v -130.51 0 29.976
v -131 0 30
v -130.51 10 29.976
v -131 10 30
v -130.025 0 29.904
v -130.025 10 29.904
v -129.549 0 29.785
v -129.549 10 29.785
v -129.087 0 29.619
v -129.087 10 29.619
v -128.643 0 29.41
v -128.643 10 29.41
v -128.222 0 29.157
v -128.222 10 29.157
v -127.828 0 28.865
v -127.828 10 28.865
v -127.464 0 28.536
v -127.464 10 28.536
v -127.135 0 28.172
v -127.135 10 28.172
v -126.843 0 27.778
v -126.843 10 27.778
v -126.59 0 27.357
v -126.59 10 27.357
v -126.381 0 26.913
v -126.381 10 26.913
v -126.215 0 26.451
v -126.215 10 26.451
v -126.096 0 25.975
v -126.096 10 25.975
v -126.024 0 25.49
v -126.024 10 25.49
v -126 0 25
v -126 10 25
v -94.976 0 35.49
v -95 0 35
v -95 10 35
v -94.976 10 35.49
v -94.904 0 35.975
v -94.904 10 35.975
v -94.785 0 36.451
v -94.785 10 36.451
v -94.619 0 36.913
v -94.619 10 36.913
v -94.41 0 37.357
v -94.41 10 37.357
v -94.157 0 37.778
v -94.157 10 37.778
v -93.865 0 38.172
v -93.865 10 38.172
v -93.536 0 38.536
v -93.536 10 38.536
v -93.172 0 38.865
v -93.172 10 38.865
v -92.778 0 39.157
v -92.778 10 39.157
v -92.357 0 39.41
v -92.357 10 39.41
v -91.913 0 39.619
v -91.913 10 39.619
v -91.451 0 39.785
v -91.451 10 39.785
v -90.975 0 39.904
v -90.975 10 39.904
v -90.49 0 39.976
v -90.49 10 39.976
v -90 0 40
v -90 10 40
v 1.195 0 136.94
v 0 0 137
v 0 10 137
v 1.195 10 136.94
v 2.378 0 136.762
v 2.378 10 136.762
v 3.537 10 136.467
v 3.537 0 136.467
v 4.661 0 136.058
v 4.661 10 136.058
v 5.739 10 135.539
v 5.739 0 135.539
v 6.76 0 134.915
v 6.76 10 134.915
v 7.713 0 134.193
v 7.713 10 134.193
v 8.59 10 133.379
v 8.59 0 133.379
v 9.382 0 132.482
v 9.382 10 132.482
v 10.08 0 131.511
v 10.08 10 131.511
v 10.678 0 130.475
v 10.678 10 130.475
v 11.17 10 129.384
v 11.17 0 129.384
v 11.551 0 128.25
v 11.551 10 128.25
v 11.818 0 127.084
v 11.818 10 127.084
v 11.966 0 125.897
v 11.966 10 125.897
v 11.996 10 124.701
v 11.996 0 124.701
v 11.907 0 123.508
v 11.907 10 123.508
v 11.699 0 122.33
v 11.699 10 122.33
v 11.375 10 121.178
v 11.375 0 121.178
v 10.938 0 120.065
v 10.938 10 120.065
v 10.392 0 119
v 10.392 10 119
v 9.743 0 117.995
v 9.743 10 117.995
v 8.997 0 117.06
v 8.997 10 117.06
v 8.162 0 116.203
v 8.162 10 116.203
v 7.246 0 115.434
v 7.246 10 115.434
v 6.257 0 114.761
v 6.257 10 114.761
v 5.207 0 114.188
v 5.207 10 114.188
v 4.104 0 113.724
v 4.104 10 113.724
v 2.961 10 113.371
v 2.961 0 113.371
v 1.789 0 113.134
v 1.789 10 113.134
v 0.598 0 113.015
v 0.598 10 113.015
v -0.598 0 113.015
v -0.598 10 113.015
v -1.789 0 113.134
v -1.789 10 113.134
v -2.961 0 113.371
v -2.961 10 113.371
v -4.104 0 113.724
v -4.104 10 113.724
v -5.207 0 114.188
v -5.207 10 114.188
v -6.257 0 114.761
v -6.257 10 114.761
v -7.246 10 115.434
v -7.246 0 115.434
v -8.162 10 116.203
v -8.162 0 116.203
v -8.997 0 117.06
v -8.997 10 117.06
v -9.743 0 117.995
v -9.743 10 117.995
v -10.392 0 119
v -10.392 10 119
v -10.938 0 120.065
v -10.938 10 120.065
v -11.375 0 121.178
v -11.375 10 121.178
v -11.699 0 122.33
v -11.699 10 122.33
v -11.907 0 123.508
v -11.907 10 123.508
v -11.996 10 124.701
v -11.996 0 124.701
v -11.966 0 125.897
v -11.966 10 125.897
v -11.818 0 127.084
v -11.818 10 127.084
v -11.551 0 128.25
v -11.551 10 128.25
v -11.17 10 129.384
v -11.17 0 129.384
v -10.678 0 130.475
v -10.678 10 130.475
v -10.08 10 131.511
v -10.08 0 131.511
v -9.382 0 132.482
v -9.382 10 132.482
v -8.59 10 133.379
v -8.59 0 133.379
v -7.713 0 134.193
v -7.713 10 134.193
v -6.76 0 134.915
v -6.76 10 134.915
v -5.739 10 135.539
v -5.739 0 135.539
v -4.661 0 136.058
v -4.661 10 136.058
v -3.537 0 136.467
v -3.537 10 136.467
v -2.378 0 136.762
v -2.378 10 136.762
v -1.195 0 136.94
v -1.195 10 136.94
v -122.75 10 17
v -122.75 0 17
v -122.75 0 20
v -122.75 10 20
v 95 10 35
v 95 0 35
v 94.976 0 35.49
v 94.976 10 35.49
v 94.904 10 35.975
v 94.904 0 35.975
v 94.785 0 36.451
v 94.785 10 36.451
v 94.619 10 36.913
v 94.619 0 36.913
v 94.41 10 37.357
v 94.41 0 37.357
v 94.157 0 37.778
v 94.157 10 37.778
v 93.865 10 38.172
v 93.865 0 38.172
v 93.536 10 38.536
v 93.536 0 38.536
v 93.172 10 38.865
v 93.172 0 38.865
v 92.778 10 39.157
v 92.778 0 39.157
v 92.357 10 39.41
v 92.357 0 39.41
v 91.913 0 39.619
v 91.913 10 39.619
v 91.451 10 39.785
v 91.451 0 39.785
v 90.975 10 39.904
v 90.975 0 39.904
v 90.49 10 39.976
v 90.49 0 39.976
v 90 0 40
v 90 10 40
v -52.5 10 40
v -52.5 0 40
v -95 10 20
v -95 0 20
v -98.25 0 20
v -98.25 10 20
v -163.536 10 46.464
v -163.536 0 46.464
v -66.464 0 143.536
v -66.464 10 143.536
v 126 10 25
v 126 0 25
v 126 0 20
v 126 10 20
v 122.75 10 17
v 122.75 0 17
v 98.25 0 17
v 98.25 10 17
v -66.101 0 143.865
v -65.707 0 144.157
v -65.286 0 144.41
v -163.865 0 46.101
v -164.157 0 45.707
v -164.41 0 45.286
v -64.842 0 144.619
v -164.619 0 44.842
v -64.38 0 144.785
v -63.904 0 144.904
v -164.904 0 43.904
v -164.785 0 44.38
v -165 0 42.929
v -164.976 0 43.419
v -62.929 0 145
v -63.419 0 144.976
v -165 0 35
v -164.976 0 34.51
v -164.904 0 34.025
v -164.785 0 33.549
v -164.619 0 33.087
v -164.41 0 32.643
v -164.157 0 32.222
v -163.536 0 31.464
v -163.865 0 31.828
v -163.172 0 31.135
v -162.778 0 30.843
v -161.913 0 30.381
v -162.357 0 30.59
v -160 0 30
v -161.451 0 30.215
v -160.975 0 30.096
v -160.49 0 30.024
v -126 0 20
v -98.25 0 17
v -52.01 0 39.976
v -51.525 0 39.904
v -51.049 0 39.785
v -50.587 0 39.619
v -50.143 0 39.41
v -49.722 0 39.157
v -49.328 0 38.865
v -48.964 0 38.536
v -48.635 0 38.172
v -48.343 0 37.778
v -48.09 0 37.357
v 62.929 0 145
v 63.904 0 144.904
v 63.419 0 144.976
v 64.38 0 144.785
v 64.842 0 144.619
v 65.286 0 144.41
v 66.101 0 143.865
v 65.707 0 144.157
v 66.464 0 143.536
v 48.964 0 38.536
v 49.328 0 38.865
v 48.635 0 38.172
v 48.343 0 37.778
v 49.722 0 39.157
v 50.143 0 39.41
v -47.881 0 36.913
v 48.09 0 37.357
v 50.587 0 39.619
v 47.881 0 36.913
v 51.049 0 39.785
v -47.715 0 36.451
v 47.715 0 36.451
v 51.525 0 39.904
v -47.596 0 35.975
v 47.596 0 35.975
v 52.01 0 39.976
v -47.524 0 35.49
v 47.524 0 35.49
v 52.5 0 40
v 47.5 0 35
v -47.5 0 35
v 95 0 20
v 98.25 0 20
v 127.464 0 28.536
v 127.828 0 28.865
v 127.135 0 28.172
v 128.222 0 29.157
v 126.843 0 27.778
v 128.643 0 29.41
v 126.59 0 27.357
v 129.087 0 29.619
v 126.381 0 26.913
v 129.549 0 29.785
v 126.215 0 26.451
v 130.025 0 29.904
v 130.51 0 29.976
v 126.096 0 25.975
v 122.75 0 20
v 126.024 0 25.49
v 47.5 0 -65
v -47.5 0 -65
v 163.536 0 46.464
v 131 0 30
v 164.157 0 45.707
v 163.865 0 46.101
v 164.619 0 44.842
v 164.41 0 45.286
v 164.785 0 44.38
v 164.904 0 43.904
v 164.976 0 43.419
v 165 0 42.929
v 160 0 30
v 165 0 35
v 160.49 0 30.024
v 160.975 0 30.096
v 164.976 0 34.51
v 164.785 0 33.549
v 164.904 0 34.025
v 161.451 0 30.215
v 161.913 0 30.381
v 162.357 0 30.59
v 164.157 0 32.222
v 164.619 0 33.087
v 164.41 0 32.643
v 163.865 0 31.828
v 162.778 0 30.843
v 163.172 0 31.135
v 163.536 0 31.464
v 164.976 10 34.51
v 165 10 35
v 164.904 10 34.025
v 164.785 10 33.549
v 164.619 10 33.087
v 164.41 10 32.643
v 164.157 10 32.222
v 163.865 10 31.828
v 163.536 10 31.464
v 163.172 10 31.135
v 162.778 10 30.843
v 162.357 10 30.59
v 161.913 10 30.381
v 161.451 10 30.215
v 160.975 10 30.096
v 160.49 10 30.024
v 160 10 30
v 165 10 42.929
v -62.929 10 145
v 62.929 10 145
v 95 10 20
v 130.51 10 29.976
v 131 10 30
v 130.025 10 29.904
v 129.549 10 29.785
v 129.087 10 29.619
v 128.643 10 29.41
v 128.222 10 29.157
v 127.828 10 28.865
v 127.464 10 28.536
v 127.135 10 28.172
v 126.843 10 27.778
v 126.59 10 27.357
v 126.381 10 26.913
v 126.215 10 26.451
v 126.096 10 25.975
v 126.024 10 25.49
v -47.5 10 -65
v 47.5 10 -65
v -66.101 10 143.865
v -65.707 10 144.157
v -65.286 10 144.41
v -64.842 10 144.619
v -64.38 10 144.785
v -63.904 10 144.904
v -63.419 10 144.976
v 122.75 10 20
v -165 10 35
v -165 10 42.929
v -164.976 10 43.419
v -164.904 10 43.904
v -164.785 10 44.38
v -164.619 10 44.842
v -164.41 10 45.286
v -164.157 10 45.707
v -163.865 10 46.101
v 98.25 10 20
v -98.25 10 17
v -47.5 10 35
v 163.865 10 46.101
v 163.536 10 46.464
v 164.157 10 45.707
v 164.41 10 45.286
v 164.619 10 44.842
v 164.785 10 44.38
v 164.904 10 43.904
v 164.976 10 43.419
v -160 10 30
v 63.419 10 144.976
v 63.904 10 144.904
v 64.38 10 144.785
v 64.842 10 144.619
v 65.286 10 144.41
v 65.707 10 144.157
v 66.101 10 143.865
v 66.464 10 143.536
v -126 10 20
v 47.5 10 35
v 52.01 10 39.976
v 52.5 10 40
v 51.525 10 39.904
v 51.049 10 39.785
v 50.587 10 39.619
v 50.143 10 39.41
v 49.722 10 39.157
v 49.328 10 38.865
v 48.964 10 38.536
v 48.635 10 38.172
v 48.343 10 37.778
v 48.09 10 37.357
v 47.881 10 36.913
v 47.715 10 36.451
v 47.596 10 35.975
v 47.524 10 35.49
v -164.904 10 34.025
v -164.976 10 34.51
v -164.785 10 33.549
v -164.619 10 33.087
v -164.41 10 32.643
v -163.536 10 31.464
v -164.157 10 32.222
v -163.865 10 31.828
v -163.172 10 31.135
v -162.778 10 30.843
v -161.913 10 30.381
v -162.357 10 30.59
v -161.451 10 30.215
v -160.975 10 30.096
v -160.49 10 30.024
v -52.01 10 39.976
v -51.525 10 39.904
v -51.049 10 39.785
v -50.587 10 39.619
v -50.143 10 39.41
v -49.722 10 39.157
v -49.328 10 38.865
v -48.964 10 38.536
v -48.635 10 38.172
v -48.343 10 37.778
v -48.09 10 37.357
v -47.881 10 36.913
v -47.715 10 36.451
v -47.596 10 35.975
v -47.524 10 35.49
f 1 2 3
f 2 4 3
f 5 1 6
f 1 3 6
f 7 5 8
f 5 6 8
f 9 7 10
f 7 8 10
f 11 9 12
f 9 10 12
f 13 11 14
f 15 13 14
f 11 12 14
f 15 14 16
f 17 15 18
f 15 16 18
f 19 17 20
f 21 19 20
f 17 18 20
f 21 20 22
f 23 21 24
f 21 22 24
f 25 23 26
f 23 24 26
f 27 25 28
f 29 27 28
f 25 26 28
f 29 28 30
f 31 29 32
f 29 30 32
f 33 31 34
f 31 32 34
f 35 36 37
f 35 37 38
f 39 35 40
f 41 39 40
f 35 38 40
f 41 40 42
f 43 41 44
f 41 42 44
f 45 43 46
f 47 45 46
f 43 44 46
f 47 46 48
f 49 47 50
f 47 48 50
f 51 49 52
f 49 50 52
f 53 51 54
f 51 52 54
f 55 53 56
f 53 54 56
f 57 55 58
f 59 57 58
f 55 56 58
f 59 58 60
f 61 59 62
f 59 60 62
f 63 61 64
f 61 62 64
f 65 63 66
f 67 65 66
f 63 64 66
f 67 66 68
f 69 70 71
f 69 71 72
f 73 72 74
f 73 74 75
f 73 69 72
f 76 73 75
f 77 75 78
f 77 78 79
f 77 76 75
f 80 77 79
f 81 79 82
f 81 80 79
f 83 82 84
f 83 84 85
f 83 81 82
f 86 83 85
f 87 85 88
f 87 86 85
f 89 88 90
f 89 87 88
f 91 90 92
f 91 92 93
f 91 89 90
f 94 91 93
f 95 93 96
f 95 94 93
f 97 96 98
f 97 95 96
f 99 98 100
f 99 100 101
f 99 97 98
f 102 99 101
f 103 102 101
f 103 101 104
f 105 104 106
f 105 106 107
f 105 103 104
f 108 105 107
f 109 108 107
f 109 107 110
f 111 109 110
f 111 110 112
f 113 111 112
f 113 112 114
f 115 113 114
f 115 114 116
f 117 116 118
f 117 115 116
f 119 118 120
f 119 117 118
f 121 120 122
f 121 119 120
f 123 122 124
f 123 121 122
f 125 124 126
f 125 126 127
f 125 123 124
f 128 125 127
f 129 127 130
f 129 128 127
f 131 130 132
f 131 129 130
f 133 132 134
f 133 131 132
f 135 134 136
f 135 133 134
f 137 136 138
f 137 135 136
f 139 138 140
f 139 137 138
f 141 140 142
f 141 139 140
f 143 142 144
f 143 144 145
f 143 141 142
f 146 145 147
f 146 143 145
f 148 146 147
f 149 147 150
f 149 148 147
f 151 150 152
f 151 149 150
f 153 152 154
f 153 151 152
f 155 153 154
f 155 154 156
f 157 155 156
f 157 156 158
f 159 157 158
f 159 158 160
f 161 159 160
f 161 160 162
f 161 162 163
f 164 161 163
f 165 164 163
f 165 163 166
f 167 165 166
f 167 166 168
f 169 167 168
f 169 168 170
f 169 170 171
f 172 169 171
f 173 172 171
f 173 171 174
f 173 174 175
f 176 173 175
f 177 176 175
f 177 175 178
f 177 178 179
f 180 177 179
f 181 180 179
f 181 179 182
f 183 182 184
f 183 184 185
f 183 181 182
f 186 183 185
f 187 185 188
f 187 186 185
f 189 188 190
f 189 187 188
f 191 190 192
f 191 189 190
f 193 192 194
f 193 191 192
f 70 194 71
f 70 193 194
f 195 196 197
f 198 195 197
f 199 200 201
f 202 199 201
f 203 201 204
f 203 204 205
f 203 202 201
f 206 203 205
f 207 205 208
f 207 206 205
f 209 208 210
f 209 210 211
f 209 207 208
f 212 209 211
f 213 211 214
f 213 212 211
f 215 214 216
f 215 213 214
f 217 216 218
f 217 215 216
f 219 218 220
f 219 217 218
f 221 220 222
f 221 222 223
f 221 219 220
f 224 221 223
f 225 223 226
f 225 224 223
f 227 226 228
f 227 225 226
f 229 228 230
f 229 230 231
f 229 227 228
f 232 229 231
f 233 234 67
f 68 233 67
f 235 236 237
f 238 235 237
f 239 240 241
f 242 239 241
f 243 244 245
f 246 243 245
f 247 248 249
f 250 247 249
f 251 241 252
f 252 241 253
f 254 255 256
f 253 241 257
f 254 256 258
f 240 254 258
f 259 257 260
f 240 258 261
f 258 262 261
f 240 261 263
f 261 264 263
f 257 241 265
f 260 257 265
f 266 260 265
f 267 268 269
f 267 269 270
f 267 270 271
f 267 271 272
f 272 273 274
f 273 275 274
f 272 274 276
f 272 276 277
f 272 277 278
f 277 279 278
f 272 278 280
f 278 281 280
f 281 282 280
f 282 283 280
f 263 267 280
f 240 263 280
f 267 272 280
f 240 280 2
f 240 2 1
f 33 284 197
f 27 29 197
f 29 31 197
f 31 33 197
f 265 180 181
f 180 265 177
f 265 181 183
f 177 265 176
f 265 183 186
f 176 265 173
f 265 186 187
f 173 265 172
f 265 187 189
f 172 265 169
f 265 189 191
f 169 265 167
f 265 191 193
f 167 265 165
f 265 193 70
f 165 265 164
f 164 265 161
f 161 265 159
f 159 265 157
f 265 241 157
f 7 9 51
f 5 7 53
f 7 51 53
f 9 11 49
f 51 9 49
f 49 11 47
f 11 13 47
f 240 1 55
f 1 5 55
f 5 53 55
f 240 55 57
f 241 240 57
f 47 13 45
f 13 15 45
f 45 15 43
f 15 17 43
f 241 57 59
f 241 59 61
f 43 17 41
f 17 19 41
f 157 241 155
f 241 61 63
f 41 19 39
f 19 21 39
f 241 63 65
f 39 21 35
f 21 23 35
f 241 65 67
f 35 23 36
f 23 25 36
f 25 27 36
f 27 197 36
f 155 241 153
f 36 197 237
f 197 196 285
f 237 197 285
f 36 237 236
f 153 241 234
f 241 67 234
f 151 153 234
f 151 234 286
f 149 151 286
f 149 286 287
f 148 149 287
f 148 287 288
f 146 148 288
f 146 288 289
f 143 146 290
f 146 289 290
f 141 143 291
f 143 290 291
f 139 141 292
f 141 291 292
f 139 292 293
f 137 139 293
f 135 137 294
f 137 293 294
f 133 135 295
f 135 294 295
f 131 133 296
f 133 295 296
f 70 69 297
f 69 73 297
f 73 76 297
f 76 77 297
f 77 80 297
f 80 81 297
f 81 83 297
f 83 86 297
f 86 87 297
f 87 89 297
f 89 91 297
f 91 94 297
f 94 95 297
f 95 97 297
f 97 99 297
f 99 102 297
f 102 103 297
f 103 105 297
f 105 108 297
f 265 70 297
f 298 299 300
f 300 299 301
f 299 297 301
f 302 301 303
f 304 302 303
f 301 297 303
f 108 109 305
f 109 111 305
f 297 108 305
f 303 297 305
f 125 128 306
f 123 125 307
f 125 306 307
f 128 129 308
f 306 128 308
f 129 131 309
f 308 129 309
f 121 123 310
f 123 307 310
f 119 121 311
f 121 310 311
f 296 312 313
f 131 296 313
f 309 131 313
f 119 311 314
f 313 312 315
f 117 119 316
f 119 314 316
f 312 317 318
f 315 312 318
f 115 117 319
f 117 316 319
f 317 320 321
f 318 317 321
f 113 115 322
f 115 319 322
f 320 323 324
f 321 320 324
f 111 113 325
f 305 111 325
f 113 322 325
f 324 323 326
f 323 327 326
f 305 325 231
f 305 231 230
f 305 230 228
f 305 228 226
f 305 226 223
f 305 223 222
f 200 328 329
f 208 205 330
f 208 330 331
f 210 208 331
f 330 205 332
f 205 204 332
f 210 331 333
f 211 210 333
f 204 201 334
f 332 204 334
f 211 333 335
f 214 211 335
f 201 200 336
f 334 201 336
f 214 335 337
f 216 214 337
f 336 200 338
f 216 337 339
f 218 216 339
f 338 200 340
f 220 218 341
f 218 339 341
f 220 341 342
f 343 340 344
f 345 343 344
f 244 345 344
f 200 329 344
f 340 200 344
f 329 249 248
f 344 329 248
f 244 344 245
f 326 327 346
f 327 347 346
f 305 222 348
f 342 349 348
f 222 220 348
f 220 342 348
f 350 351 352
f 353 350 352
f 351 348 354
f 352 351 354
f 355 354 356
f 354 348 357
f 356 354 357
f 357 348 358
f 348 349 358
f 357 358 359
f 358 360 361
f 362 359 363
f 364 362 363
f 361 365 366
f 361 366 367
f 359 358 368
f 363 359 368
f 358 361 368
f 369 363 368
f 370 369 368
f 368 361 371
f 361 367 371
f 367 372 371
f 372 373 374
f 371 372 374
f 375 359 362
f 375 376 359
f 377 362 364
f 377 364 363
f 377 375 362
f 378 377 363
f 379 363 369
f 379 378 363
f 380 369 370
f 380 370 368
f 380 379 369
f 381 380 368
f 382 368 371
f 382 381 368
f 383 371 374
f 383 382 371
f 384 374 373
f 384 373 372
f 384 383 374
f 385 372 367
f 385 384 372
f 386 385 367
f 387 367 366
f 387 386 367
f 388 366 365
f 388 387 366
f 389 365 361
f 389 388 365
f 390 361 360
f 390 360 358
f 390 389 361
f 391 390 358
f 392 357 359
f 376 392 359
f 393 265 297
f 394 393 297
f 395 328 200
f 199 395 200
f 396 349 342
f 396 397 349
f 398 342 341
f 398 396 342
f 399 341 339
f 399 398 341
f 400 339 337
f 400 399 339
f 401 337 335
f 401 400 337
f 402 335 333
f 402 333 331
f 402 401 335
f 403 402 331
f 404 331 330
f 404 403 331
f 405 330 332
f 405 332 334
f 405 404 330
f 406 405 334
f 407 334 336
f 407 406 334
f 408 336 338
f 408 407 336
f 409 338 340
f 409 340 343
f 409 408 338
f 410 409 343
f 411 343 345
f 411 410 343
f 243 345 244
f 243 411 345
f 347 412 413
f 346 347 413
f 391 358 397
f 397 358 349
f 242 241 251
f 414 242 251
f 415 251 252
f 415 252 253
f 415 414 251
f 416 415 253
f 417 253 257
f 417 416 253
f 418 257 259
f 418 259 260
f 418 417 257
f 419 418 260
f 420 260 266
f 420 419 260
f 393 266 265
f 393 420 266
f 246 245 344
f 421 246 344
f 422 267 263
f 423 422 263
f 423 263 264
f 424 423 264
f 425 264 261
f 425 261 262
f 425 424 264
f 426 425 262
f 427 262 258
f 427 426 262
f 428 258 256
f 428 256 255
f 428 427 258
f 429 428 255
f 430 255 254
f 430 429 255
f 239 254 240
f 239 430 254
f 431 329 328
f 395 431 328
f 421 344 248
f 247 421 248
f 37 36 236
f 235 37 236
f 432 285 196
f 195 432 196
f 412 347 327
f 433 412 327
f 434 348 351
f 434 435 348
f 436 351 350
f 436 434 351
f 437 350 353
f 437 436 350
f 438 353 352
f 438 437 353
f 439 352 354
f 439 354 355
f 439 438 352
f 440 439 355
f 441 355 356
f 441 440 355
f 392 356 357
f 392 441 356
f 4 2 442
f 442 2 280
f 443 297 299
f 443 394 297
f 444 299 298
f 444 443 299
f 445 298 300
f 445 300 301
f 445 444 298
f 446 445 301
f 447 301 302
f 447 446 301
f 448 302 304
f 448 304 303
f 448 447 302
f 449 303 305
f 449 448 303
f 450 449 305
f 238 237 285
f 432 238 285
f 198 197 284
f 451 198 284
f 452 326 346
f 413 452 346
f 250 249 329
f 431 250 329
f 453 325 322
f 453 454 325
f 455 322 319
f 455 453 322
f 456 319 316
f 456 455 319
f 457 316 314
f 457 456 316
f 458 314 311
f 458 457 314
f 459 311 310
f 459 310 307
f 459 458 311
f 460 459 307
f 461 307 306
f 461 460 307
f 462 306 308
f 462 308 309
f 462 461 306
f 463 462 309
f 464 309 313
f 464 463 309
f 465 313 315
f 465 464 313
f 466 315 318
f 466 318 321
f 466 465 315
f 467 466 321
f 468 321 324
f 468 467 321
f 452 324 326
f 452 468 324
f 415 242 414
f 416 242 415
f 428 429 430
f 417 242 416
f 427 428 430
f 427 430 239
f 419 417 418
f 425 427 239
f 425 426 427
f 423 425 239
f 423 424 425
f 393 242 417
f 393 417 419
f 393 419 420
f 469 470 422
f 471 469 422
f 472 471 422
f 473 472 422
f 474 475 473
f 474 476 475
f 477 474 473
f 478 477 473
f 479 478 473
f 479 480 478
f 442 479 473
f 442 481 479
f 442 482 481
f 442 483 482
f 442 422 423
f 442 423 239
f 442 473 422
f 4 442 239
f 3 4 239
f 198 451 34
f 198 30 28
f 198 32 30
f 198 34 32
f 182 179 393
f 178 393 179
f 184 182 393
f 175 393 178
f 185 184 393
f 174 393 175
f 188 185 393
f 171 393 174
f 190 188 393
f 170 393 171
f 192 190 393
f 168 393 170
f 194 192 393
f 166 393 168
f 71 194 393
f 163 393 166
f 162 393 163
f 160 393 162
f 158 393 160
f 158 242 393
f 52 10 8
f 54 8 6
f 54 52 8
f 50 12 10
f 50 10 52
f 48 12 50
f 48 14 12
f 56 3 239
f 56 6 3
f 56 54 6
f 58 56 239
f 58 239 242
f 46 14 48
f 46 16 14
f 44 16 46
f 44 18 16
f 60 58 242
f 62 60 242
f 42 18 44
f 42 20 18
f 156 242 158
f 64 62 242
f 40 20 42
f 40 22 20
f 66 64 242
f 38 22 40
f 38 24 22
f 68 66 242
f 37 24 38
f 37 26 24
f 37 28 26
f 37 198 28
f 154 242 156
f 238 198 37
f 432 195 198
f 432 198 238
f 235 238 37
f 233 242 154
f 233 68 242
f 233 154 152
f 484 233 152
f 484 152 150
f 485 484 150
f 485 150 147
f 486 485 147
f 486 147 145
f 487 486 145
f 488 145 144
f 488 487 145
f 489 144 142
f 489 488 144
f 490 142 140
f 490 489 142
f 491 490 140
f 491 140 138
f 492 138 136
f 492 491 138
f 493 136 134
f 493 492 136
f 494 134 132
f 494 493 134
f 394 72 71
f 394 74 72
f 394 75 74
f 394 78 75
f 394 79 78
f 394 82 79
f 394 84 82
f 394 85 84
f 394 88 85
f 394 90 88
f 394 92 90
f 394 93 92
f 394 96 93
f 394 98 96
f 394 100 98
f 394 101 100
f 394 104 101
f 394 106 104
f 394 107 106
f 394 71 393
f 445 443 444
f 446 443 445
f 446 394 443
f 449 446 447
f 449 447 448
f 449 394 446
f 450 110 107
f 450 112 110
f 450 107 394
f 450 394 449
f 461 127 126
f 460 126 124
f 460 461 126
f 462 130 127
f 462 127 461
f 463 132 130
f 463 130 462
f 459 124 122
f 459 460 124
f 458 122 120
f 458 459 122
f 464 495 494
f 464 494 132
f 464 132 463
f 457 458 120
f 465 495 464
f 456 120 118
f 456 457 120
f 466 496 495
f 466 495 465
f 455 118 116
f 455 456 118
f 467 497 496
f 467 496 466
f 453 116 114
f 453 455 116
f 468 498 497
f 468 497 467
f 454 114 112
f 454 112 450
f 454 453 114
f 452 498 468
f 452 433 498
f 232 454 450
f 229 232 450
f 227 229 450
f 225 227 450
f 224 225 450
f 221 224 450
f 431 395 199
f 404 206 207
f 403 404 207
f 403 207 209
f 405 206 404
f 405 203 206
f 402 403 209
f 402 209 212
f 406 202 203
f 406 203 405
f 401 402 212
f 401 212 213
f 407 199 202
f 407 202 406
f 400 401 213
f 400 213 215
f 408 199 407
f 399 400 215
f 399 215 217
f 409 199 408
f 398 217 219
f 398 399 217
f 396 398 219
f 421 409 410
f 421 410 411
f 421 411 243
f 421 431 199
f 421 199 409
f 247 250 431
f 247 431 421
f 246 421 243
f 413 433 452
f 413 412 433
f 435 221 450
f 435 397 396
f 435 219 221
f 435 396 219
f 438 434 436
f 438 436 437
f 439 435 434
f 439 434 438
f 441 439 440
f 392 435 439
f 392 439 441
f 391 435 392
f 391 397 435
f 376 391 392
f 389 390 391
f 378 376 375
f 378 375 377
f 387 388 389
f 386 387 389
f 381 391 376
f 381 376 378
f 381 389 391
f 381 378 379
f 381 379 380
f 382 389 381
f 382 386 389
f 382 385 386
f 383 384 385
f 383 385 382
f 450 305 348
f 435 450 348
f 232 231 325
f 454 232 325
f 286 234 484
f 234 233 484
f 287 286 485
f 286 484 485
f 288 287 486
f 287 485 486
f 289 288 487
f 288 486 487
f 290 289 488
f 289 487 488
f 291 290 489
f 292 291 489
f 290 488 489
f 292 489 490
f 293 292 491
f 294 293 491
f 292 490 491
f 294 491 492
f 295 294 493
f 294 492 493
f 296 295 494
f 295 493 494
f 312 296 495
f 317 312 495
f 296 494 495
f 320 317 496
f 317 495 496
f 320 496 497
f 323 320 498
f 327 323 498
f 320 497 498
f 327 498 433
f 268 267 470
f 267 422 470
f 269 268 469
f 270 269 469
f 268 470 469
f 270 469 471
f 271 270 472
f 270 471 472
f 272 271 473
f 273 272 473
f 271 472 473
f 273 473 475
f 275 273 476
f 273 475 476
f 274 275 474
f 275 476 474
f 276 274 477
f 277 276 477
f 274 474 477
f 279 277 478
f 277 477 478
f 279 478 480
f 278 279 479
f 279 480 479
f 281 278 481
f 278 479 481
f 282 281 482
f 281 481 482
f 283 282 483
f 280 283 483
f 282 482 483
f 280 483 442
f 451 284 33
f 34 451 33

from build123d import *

# Parameters (mm, degrees)
SKETCH1_R               = 12
EXTRUDE1_DEPTH          = 10
FILLET1_R               = 5
ESQUISSE1_W             = 95
ESQUISSE1_H             = 80
ENL_V_MAT_EXTRU_1_DEPTH = 220.886334273


with BuildPart() as part:
    # Sketch1 → Extrude1 (new body)
    with BuildSketch(Plane(origin=(0, 0, 0), x_dir=(1, 0, 0), z_dir=(0, 1, 0))):
        Polygon((-165, -30), (-165, -45), (-65, -145), (65, -145), (165, -45), (165, -30), (126, -30), (126, -20), (122.75, -20), (122.75, -17), (98.25, -17), (98.25, -20), (95, -20), (95, -40), (47.5, -40), (47.5, 123.333333333), (15, 145), (-15, 145), (-47.5, 123.333333333), (-47.5, -40), (-95, -40), (-95, -20), (-98.25, -20), (-98.25, -17), (-122.75, -17), (-122.75, -20), (-126, -20), (-126, -30), align=None)
        with Locations(Location((0, 113, 0), (0, 0, 270))):
            Circle(SKETCH1_R, mode=Mode.SUBTRACT)
        with Locations(Location((0, -125, 0), (0, 0, 270))):
            Circle(SKETCH1_R, mode=Mode.SUBTRACT)
    extrude(amount=EXTRUDE1_DEPTH)

    # Fillet1
    fillet1_edges = [part.edges().sort_by_distance(p)[0] for p in [
        (-126, 5, 30),
        (-95, 5, 40),
        (-47.5, 5, 40),
        (-47.5, 5, -123.333333333),
        (-15, 5, -145),
        (15, 5, -145),
        (47.5, 5, -123.333333333),
        (47.5, 5, 40),
        (95, 5, 40),
        (126, 5, 30),
        (165, 5, 30),
        (165, 5, 45),
        (65, 5, 145),
        (-65, 5, 145),
        (-165, 5, 45),
        (-165, 5, 30),
    ]]
    fillet(fillet1_edges, radius=FILLET1_R)

    # Esquisse1 → Enlèv. mat.-Extru.1 (cut, through all)
    with BuildSketch(Plane(origin=(0, 10, 0), x_dir=(1, 0, 0), z_dir=(0, 1, 0))):
        with Locations((0, 105)):
            Rectangle(ESQUISSE1_W, ESQUISSE1_H)
    extrude(amount=-ENL_V_MAT_EXTRU_1_DEPTH, mode=Mode.SUBTRACT)


solid = part.part
